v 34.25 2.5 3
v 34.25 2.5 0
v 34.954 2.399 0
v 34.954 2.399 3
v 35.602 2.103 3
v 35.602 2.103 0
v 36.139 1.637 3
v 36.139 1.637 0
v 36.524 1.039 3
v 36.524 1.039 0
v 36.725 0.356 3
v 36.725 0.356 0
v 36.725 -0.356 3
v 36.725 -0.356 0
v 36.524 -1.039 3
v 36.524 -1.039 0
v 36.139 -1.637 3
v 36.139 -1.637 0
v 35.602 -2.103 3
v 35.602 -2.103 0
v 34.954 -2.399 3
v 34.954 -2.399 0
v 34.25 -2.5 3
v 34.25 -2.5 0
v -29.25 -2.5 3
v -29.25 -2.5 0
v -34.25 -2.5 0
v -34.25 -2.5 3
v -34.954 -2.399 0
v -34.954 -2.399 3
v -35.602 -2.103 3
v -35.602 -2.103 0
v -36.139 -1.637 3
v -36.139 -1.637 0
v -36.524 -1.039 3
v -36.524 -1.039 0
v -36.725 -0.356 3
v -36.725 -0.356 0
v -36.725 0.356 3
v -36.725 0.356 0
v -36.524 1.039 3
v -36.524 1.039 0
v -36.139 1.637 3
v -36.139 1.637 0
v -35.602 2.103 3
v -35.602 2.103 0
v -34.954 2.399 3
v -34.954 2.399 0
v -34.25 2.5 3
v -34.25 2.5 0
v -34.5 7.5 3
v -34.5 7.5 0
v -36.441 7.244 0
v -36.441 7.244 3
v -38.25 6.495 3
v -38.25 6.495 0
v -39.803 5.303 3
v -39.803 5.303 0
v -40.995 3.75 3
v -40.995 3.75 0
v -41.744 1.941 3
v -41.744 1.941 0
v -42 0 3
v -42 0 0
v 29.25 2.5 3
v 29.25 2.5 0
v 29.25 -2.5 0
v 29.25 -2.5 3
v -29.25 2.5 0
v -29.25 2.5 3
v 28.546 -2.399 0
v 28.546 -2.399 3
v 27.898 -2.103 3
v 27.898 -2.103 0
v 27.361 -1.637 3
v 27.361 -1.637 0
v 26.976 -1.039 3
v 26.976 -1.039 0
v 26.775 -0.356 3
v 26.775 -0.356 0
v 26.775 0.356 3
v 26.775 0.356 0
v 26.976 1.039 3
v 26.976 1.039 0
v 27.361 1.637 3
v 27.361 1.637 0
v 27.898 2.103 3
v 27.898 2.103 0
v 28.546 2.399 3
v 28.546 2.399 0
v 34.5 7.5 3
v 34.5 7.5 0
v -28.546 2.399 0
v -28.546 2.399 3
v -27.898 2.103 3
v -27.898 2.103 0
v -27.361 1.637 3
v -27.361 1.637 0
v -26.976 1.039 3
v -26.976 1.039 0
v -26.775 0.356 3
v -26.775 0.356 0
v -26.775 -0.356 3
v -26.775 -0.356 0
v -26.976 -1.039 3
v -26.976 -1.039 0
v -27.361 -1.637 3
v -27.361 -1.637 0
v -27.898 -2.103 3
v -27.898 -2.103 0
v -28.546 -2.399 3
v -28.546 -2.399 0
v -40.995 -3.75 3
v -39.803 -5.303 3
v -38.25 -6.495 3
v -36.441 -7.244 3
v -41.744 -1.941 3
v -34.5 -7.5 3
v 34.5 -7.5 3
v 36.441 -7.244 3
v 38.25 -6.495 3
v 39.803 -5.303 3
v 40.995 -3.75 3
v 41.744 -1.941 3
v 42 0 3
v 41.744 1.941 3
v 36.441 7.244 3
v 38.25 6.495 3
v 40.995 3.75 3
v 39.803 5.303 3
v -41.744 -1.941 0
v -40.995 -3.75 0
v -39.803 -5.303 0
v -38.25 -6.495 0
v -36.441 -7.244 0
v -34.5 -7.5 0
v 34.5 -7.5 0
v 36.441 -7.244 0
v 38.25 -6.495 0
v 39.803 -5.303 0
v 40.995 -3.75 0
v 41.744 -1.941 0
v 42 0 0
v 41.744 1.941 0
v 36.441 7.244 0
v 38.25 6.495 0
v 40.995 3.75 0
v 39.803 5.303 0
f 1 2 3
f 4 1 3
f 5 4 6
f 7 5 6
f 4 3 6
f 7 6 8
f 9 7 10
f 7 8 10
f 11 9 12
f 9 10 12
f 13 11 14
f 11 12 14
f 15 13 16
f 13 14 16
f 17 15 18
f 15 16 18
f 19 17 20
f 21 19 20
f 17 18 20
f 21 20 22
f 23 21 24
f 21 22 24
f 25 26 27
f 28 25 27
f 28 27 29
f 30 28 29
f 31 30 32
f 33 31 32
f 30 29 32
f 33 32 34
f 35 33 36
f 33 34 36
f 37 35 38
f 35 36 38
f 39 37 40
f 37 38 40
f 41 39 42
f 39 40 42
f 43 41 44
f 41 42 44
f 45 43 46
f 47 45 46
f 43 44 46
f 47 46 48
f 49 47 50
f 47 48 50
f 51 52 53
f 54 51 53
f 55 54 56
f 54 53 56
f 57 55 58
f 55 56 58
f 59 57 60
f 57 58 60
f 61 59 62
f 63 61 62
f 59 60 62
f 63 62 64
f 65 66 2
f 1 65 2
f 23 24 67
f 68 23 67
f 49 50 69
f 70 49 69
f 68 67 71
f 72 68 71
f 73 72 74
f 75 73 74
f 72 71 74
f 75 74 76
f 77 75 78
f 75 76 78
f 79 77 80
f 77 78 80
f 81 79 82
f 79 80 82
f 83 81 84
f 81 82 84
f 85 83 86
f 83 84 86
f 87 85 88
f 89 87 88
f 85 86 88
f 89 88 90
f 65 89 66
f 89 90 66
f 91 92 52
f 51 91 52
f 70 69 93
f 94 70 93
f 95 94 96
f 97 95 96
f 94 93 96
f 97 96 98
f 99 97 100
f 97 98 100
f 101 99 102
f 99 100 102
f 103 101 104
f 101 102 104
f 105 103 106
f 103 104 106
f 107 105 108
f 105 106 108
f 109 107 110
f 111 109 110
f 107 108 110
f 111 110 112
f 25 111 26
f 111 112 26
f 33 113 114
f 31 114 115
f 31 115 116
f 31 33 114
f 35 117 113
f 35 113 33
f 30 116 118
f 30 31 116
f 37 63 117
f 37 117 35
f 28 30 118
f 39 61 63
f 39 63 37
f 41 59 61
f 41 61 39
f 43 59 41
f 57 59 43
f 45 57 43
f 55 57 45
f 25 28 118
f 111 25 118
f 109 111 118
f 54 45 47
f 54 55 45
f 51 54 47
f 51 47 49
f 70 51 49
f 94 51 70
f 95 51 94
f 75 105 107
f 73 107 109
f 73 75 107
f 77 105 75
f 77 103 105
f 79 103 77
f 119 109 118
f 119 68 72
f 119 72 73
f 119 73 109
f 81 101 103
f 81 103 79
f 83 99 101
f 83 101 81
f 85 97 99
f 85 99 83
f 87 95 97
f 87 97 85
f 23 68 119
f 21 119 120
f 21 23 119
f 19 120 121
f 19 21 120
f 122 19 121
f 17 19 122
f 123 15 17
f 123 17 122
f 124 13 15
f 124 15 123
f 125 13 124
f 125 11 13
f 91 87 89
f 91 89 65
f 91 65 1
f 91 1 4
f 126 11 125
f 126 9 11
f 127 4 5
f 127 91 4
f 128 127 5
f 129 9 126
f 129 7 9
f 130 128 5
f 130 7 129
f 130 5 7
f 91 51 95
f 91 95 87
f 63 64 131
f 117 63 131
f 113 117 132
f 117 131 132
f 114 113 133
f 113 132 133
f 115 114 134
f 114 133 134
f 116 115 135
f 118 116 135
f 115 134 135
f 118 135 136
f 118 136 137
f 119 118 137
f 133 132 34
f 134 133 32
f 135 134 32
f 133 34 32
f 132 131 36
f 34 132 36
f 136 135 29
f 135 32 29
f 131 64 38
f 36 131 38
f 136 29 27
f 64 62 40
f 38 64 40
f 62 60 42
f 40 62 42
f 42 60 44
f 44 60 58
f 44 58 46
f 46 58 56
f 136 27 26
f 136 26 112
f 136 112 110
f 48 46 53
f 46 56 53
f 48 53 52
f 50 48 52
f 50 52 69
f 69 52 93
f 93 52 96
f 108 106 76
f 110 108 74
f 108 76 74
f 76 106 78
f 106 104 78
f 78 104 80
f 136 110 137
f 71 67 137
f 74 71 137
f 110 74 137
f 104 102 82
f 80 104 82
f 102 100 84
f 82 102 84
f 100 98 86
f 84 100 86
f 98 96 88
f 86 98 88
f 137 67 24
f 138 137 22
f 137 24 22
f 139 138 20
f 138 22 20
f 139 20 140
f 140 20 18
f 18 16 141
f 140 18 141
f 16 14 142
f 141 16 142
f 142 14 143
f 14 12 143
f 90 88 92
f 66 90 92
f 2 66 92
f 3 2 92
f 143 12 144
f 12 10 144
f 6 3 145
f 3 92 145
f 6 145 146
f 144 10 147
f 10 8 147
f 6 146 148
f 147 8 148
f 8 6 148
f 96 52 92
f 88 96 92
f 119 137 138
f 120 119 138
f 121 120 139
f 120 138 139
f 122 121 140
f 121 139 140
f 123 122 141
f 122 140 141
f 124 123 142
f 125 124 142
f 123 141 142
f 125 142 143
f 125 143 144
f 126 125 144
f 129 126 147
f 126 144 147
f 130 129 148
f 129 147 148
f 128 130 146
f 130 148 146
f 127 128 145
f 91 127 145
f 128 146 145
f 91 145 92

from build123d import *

# Parameters (mm, degrees)
F1_DEPTH = 3


with BuildPart() as f1:
    # F0 (on Top) → F1 (new body)
    with BuildSketch(Plane.XY):
        with BuildLine():
            ThreePointArc((-34.25, 2.5), (-36.75, 0), (-34.25, -2.5))
            Line((-34.25, -2.5), (-29.25, -2.5))
            ThreePointArc((-29.25, -2.5), (-26.75, 0), (-29.25, 2.5))
            Line((-29.25, 2.5), (-34.25, 2.5))
        make_face()
        with BuildLine():
            Line((0, -7.5), (0, 7.5))
            Line((0, 7.5), (-34.5, 7.5))
            ThreePointArc((-34.5, 7.5), (-39.803301, 5.303301), (-42, 0))
            ThreePointArc((-42, 0), (-39.803301, -5.303301), (-34.5, -7.5))
            Line((-34.5, -7.5), (0, -7.5))
        make_face()
        with BuildLine():
            Line((-29.25, -2.5), (-34.25, -2.5))
            ThreePointArc((-34.25, -2.5), (-36.75, 0), (-34.25, 2.5))
            Line((-34.25, 2.5), (-29.25, 2.5))
            ThreePointArc((-29.25, 2.5), (-26.75, 0), (-29.25, -2.5))
        make_face(mode=Mode.SUBTRACT)
        with BuildLine():
            Line((34.5, 7.5), (0, 7.5))
            Line((0, 7.5), (0, -7.5))
            Line((0, -7.5), (34.5, -7.5))
            ThreePointArc((34.5, -7.5), (39.803301, -5.303301), (42, 0))
            ThreePointArc((42, 0), (39.803301, 5.303301), (34.5, 7.5))
        make_face()
        with BuildLine():
            ThreePointArc((29.25, -2.5), (26.75, 0), (29.25, 2.5))
            Line((29.25, 2.5), (34.25, 2.5))
            ThreePointArc((34.25, 2.5), (36.75, 0), (34.25, -2.5))
            Line((34.25, -2.5), (29.25, -2.5))
        make_face(mode=Mode.SUBTRACT)
    extrude(amount=F1_DEPTH)


solid = f1.part
